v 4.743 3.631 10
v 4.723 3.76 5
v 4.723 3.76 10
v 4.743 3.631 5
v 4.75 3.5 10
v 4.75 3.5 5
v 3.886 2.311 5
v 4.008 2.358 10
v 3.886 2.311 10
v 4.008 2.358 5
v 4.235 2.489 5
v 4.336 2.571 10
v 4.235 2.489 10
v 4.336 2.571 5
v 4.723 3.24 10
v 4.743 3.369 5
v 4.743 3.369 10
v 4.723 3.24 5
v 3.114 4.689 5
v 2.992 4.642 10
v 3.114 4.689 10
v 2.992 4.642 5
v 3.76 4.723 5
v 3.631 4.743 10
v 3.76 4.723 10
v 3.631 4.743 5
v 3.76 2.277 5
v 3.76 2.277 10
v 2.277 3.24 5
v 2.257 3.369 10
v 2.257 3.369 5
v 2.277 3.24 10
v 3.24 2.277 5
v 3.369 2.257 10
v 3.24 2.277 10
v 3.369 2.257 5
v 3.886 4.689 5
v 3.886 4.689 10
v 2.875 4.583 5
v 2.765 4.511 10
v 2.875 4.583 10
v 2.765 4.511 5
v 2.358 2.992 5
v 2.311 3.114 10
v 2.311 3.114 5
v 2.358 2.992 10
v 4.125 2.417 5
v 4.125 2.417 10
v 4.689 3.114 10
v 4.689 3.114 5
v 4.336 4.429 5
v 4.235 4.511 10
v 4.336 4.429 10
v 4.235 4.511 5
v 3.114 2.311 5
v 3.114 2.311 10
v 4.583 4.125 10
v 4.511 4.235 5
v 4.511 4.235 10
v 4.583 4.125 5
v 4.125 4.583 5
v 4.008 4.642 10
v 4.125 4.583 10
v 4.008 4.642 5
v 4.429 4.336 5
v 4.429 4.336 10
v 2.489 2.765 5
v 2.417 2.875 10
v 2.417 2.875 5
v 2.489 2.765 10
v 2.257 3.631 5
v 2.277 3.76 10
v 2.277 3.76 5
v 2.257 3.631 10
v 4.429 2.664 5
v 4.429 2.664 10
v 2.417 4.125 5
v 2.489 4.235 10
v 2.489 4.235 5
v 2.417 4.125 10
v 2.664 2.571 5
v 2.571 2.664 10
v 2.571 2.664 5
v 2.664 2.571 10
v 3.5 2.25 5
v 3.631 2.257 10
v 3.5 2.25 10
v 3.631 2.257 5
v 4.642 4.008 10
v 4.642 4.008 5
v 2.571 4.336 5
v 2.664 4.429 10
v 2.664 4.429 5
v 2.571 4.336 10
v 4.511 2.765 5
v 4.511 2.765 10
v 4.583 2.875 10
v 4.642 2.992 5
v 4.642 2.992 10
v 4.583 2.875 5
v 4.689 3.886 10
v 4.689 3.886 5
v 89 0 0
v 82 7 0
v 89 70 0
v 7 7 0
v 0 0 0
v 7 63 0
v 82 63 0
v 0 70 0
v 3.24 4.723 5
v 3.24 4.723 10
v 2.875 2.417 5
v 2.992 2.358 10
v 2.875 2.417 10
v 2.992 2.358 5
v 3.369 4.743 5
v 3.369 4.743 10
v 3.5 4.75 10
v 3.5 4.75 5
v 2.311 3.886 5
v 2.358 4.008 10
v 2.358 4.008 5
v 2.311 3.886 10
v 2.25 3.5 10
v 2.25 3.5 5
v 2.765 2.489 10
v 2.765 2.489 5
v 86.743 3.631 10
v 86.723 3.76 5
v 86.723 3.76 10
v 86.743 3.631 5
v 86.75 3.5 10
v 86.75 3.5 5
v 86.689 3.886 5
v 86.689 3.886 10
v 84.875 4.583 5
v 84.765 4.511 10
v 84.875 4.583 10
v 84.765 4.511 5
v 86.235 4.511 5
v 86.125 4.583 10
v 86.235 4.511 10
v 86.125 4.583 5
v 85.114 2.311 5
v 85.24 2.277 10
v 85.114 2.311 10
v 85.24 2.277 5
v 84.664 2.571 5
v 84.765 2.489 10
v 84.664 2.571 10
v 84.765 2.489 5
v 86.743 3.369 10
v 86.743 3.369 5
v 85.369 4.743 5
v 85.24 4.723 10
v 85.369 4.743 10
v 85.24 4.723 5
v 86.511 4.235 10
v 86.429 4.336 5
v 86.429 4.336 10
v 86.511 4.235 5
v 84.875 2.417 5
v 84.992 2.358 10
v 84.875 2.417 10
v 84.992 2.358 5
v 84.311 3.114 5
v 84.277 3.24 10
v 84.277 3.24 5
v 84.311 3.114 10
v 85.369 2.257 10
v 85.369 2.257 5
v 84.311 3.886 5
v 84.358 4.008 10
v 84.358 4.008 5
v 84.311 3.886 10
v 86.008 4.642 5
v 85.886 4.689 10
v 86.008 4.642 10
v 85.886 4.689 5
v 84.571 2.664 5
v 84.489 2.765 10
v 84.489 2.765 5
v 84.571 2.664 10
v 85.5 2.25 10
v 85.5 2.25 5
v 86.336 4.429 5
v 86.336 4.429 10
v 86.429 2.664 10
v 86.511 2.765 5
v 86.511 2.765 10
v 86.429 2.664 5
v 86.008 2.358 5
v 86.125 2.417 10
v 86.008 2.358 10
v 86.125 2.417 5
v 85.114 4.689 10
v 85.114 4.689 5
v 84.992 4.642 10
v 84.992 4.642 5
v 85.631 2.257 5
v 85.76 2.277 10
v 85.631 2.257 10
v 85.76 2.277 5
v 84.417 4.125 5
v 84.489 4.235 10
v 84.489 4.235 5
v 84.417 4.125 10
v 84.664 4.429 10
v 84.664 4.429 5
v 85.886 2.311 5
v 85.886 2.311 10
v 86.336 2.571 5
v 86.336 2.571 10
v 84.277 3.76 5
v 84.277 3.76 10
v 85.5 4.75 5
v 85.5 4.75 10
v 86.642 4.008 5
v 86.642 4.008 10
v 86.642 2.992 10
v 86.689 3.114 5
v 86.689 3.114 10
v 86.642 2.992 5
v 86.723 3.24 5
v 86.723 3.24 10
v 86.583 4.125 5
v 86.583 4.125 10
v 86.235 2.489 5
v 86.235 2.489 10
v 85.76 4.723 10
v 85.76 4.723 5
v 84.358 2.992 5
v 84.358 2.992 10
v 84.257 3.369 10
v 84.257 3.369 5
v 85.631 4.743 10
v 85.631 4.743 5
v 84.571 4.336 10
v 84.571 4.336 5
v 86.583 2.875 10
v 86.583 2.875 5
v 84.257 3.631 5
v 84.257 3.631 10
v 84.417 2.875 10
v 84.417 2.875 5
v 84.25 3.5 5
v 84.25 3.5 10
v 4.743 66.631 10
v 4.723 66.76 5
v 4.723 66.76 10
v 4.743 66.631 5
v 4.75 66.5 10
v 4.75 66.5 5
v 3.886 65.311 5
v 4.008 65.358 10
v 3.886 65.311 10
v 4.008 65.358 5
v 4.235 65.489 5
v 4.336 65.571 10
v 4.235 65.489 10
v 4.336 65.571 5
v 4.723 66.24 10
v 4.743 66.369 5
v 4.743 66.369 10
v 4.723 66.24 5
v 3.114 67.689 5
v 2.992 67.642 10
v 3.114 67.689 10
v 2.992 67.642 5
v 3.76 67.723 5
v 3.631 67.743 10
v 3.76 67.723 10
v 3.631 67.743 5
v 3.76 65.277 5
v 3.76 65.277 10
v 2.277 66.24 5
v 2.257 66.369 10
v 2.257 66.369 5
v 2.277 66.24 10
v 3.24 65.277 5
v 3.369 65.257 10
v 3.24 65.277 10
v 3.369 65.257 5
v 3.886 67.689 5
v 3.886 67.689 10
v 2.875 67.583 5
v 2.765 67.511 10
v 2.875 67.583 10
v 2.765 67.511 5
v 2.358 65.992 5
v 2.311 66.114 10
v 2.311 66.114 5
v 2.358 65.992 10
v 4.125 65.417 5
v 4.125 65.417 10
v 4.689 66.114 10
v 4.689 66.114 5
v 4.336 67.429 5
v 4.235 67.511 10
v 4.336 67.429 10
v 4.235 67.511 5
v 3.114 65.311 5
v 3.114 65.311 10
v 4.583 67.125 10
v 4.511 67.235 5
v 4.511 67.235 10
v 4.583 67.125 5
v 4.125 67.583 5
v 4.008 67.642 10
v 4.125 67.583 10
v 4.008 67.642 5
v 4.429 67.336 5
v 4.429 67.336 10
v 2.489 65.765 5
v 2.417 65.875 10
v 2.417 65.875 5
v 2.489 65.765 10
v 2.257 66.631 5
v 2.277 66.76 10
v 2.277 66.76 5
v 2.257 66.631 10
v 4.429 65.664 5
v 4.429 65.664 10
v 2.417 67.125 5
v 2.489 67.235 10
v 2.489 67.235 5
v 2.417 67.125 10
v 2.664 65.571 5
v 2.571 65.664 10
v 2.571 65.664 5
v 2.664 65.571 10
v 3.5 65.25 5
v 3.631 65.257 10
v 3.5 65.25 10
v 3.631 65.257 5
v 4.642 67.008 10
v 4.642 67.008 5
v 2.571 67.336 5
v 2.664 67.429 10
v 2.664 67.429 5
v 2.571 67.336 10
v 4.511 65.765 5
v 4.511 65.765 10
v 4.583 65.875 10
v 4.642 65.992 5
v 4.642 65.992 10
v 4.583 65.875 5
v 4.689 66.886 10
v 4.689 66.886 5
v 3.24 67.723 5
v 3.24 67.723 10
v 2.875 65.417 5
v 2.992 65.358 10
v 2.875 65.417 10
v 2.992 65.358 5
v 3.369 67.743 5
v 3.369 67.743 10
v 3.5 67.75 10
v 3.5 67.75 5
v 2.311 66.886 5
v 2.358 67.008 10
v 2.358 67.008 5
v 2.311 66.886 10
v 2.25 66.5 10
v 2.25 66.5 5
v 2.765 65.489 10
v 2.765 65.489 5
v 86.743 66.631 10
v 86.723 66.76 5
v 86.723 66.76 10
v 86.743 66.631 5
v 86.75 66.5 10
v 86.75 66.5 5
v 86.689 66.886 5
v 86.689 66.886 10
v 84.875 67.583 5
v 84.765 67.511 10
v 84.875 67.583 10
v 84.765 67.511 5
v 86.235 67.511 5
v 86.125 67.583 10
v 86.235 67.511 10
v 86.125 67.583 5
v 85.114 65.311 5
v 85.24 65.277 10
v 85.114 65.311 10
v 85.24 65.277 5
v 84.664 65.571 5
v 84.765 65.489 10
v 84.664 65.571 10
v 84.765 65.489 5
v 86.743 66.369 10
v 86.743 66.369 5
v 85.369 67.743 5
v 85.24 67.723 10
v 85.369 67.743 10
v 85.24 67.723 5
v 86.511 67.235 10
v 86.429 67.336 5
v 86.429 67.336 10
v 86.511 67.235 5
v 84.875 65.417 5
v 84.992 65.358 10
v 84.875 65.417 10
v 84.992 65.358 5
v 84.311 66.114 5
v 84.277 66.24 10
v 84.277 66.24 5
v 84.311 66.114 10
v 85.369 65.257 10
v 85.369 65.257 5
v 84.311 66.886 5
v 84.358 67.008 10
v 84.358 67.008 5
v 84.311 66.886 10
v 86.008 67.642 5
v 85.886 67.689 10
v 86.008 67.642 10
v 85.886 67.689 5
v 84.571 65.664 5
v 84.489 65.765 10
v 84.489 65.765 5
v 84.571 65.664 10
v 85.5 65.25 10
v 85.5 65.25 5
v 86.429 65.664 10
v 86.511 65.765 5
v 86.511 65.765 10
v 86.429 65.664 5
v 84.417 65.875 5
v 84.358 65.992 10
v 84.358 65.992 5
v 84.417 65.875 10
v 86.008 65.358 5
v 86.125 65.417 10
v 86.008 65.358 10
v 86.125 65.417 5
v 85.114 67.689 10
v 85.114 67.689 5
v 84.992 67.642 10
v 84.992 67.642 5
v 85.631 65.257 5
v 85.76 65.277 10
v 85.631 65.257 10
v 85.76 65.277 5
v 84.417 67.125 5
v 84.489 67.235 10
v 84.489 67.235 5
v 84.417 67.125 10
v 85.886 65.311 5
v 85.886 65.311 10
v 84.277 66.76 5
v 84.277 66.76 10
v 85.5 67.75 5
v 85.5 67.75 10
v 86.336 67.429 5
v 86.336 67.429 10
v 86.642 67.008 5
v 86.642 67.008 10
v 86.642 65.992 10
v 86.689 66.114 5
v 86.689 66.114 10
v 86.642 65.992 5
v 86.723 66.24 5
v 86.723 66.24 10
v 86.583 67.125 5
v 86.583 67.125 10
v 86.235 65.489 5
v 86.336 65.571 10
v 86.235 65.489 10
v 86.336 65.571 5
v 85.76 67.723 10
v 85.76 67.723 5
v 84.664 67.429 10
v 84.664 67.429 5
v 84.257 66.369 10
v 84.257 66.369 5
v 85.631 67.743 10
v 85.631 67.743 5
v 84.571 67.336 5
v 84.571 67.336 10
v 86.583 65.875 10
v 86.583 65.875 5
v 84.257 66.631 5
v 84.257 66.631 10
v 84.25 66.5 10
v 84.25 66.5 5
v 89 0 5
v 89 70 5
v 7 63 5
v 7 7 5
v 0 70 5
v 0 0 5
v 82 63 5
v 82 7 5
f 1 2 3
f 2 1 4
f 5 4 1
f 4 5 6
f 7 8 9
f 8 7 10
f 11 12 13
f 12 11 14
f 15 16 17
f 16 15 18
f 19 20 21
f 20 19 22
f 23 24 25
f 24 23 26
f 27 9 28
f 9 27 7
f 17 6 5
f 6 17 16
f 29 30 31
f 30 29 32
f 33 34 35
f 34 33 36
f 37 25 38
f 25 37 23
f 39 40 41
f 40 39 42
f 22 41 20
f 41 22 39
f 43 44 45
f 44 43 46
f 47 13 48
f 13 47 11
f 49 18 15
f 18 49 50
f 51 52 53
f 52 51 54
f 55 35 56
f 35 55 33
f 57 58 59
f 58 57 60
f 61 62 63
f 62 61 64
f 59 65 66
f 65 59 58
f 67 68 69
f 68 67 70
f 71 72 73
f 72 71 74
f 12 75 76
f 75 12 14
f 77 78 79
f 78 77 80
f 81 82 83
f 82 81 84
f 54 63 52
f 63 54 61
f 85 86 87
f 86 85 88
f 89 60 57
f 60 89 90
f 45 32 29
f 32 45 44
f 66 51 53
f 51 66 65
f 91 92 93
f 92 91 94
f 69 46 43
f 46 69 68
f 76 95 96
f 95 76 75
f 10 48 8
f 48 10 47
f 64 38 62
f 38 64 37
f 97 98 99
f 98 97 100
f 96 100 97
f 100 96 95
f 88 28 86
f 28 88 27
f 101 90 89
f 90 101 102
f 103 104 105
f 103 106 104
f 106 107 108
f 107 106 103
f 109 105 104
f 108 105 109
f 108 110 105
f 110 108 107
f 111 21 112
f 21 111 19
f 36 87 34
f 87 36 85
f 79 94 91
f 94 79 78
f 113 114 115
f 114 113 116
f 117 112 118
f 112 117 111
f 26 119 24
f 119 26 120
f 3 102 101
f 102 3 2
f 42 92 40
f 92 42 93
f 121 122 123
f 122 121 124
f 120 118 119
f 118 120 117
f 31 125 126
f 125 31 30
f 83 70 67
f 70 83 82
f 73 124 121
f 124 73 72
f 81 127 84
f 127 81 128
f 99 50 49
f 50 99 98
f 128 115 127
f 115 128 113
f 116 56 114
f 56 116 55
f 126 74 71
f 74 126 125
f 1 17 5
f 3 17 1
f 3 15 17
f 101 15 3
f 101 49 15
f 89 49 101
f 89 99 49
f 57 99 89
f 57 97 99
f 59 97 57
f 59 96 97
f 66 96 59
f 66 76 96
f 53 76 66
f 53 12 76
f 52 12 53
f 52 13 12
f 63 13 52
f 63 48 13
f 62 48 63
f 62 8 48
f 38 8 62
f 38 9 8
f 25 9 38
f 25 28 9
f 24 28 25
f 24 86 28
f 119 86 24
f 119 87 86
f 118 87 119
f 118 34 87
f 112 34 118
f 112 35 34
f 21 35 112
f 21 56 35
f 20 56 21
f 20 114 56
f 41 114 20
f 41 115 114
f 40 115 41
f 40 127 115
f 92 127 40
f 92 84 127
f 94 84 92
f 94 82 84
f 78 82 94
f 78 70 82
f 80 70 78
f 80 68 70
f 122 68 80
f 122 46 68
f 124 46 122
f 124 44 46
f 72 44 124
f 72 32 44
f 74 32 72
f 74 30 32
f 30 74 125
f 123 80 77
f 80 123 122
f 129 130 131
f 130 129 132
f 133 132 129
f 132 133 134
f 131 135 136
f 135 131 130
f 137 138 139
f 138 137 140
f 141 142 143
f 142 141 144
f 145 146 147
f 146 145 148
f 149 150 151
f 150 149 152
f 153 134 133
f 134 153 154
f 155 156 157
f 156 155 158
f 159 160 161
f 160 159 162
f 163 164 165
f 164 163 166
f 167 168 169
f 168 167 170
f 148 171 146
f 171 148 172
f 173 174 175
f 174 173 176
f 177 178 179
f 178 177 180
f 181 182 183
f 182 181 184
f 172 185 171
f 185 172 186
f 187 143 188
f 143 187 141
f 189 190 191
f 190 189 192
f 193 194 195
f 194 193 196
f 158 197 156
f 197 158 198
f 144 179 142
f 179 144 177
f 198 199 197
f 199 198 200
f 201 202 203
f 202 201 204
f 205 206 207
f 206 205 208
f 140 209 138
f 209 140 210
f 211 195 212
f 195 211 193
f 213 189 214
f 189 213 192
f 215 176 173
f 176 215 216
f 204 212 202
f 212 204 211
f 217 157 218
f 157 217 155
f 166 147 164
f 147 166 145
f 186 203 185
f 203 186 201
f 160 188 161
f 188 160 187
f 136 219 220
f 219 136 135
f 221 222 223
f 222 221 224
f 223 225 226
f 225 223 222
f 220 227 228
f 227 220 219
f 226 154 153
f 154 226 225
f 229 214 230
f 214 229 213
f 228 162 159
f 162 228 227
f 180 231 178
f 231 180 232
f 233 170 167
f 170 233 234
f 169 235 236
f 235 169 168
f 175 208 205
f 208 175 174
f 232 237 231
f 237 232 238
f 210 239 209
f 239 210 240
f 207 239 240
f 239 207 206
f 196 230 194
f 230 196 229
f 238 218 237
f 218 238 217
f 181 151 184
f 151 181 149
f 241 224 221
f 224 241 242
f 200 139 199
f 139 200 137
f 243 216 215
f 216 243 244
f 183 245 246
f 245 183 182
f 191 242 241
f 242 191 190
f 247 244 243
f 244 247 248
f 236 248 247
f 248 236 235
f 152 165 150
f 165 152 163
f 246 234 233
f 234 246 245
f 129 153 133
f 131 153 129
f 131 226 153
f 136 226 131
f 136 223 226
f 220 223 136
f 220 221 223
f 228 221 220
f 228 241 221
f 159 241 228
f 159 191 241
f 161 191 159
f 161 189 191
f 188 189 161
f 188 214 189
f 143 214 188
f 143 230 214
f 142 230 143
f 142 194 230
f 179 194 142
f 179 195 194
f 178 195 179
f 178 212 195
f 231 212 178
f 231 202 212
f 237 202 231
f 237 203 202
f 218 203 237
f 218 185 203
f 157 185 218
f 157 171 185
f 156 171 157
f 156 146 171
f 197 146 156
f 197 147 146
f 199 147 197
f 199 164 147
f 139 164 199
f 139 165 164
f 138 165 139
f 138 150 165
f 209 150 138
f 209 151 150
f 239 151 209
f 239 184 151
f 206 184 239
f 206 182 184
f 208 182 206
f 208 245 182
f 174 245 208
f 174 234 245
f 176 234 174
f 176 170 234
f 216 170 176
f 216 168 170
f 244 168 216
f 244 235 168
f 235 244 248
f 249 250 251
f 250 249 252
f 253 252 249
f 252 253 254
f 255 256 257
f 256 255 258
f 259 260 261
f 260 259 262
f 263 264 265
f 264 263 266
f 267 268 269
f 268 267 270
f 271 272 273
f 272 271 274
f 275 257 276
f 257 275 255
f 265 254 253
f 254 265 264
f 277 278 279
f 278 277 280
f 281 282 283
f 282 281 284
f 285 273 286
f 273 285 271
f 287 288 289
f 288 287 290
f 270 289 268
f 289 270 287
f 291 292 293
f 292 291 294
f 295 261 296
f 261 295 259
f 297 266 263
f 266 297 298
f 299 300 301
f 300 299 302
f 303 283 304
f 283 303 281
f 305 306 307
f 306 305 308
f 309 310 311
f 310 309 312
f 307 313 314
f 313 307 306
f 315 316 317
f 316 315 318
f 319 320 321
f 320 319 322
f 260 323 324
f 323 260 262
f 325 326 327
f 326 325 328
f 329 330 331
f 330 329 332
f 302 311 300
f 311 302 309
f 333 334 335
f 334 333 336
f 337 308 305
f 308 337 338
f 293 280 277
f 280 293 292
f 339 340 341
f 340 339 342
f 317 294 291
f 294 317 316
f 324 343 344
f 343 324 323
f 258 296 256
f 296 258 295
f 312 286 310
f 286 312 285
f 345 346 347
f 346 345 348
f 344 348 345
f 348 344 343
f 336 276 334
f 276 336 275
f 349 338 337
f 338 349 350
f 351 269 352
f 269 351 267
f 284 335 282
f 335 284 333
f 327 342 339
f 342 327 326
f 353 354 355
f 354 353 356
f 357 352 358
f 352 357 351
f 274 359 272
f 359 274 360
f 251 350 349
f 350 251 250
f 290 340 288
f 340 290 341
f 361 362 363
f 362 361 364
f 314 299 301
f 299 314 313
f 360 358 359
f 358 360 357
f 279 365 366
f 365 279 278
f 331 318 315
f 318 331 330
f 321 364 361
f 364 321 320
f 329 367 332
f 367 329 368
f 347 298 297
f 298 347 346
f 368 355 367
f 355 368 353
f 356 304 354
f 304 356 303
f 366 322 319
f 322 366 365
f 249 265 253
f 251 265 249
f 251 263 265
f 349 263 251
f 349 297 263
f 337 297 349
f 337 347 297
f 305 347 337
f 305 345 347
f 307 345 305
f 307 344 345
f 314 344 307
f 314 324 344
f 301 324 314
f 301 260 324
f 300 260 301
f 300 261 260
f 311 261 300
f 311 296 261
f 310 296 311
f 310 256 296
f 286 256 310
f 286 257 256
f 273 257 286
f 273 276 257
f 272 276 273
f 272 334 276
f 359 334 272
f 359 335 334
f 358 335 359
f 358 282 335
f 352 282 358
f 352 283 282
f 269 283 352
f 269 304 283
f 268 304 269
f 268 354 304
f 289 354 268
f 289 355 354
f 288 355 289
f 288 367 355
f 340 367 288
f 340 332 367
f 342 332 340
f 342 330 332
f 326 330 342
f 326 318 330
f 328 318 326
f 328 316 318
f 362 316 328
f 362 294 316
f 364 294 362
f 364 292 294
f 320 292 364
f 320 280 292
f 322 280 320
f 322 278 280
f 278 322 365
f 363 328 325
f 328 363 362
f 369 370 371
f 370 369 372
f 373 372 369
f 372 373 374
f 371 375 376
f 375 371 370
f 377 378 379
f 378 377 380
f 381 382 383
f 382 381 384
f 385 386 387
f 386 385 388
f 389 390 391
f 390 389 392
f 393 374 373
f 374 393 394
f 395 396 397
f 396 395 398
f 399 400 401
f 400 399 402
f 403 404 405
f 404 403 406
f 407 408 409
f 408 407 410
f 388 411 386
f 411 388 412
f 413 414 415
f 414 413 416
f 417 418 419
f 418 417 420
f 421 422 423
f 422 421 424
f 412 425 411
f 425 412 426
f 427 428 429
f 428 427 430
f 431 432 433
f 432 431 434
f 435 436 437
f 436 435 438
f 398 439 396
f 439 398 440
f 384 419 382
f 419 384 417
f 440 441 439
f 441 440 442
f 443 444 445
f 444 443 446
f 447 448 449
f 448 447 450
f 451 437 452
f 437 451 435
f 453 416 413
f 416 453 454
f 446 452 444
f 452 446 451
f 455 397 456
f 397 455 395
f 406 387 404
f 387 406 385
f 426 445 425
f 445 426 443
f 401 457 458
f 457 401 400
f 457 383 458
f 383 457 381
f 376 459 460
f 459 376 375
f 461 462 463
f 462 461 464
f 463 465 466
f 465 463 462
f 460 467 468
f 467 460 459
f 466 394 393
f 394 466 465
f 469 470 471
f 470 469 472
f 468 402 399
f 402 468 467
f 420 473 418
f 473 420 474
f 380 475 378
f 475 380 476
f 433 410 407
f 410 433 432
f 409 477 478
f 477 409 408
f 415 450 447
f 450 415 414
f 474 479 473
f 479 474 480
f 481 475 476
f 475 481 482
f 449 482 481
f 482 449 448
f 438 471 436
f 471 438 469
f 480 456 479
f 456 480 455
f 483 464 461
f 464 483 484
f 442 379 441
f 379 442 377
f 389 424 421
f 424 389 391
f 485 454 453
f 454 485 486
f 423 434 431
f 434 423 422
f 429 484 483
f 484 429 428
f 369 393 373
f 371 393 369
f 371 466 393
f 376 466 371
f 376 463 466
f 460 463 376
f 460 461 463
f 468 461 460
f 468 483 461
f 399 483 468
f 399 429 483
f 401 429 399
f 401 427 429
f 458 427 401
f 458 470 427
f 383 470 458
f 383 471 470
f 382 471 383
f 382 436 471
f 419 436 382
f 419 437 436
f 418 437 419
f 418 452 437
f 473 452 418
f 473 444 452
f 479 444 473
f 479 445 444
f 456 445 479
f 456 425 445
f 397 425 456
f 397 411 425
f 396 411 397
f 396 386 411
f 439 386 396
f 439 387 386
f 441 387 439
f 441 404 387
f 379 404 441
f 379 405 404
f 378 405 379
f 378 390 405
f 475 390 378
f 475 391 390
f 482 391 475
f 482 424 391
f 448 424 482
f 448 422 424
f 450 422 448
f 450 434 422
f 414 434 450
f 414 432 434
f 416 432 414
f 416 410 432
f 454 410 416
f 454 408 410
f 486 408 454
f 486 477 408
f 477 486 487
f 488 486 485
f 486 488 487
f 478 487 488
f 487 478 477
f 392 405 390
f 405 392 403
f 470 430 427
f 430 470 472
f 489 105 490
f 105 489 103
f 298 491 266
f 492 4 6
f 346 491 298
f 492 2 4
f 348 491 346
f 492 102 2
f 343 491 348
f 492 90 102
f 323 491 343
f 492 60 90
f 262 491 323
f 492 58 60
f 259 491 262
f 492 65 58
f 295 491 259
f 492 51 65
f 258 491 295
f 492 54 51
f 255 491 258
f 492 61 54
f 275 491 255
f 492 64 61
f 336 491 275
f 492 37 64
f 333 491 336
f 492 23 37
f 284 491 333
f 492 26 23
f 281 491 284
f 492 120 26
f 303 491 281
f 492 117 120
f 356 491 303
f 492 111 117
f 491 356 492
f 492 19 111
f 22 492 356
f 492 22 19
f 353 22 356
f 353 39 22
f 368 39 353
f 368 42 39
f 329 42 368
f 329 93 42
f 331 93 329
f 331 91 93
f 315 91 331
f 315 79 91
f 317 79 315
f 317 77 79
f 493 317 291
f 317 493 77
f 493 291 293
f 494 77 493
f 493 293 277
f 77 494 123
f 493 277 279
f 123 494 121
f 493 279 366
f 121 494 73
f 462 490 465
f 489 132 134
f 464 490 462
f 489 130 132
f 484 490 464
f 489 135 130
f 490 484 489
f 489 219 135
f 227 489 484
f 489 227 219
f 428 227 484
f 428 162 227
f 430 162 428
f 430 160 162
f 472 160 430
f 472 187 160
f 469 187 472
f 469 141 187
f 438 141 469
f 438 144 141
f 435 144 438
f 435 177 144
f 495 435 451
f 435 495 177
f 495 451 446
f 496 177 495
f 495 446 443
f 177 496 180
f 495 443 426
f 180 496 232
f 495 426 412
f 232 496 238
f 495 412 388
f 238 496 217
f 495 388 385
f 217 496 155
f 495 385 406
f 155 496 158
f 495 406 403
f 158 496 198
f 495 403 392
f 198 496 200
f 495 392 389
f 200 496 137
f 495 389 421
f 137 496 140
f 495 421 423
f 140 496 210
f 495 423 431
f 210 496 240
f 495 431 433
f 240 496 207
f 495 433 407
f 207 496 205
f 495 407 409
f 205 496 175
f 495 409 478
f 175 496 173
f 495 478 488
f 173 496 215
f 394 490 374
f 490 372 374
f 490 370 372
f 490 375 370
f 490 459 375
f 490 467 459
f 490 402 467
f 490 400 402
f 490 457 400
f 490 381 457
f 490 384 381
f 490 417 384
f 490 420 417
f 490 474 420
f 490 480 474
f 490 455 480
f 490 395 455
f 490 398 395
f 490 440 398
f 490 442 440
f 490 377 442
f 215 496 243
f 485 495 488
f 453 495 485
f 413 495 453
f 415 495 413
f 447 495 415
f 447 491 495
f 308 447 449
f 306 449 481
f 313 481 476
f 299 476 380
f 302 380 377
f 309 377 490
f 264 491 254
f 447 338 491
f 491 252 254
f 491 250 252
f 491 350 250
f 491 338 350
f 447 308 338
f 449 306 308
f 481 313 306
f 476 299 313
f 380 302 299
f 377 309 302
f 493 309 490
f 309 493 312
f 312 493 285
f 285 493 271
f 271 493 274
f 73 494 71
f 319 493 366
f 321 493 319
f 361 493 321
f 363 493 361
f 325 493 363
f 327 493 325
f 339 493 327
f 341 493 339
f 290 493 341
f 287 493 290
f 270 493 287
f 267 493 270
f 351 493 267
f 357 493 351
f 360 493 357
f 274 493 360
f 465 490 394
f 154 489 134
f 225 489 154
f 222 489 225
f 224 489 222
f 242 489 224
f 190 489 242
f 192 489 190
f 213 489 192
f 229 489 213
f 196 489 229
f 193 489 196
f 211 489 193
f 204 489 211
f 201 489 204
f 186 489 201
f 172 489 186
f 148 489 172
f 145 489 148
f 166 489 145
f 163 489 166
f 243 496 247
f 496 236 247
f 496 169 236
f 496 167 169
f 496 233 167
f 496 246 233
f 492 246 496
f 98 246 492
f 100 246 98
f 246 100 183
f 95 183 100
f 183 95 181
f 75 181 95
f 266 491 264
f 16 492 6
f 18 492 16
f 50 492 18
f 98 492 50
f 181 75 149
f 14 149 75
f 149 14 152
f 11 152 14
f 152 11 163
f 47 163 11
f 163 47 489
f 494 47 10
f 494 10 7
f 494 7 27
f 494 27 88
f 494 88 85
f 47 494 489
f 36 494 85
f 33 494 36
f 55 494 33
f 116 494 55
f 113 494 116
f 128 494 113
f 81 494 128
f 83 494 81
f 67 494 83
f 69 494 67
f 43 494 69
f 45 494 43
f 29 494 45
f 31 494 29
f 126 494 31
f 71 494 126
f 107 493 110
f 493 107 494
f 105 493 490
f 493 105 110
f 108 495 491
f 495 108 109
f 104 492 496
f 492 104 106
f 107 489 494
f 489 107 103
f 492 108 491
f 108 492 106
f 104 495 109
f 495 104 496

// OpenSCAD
$fn=60;
// Power-board backplate
cube([89,7,5]);
translate([3.5,3.5,0]) {
  cylinder(h=10, r=1.25);
  translate([89-7,0,0]) {
    cylinder(h=10, r=1.25);
  }
}
translate([0,70-7,0]){
  cube([89,7,5]);
  translate([3.5,3.5,0]) {
    cylinder(h=10, r=1.25);
    translate([89-7,0,0]) {
      cylinder(h=10, r=1.25);
    }
  }
}
cube([7,70,5]);
translate([89-7,0,0]) 
cube([7,70,5]);
